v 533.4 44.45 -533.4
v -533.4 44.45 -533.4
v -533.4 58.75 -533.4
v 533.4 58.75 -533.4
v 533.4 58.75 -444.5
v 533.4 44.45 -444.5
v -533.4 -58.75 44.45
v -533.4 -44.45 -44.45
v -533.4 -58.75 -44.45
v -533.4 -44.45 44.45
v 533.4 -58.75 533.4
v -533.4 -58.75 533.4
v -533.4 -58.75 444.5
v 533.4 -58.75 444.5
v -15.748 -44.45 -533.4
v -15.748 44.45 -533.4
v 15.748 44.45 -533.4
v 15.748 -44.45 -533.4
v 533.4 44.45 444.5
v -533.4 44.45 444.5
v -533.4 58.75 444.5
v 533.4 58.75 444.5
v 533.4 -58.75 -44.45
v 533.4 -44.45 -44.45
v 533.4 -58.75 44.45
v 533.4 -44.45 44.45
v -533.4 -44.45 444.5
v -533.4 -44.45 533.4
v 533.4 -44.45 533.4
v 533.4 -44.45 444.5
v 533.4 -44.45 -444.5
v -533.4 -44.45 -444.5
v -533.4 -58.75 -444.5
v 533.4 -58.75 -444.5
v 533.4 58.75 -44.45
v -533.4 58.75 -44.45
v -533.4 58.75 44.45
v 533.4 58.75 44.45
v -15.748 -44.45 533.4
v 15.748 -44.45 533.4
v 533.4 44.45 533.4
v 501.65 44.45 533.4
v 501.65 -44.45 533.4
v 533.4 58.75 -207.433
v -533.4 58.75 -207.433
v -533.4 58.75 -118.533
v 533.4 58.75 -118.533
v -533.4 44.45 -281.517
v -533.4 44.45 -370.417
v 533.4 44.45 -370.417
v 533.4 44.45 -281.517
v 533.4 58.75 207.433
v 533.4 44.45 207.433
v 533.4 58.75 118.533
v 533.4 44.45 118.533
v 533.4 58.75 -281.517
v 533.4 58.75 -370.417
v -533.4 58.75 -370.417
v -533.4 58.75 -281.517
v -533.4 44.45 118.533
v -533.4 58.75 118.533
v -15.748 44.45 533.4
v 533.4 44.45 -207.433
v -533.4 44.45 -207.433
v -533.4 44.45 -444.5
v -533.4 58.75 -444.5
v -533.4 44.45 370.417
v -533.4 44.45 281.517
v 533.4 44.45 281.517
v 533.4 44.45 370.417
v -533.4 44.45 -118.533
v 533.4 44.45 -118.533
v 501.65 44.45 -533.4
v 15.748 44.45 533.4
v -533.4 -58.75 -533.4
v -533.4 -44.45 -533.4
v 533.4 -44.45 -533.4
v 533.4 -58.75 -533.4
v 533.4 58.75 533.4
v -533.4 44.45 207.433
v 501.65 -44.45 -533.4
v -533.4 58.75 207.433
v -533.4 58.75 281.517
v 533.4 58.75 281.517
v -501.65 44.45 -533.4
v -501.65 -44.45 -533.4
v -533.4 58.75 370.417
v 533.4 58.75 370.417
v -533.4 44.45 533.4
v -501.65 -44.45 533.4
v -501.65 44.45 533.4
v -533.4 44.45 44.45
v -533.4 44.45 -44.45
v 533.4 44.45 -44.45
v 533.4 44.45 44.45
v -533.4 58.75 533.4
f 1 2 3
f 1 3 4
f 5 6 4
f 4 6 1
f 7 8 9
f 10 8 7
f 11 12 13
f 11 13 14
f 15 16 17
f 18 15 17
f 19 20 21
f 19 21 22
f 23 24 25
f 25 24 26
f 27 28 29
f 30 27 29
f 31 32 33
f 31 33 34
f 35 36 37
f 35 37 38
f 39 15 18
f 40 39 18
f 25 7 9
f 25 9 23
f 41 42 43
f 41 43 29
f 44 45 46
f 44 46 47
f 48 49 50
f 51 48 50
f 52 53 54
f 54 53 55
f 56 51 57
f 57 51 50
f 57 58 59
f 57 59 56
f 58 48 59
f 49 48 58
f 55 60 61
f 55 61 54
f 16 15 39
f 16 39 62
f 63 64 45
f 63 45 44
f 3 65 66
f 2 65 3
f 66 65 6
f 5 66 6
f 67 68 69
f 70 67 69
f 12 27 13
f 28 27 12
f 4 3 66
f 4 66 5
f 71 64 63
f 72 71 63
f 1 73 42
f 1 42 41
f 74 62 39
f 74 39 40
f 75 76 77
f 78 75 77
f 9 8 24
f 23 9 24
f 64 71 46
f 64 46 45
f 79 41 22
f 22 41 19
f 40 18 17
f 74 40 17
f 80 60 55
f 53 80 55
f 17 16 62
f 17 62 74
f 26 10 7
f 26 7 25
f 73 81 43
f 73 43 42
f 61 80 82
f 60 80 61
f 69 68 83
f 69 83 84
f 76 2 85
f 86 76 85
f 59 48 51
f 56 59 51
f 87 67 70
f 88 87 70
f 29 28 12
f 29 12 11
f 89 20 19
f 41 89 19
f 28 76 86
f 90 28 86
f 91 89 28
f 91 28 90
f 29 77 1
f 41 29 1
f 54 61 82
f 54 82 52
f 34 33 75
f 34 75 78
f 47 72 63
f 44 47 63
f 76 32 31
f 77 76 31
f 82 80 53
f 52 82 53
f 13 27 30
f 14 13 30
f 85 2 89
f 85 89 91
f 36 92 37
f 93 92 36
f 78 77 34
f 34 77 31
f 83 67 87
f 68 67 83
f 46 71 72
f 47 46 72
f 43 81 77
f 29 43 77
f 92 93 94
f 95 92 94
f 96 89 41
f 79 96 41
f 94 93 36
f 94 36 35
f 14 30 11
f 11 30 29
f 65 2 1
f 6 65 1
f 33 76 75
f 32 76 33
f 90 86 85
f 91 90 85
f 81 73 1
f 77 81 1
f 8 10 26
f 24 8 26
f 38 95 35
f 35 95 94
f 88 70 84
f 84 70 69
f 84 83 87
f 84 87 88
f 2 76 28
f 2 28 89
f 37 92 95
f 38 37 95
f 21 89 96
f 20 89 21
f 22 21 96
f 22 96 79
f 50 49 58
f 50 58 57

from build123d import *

# Parameters (mm, degrees)
BOSS_EXTRUDE1_DEPTH        = 533.4
BOSS_EXTRUDE1_DEPTH_BACK   = 533.4
SKETCH3_W                  = 31.75
SKETCH3_H                  = 88.9
BOSS_EXTRUDE1_2_DEPTH      = 533.4
BOSS_EXTRUDE1_2_DEPTH_BACK = 533.4
SKETCH3_W_2                = 31.496
BOSS_EXTRUDE1_3_DEPTH      = 533.4
BOSS_EXTRUDE1_3_DEPTH_BACK = 533.4
SKETCH4_W                  = 1066.8
SKETCH4_H                  = 88.9
BOSS_EXTRUDE2_DEPTH        = 14.3002
BOSS_EXTRUDE2_2_DEPTH      = 14.3002
BOSS_EXTRUDE2_3_DEPTH      = 14.3002
BOSS_EXTRUDE2_4_DEPTH      = 14.3002
BOSS_EXTRUDE2_5_DEPTH      = 14.3002
BOSS_EXTRUDE2_6_DEPTH      = 14.3002
BOSS_EXTRUDE2_7_DEPTH      = 14.3002
SKETCH5_W                  = 1066.8
SKETCH5_H                  = 88.9
BOSS_EXTRUDE3_DEPTH        = 14.3002
BOSS_EXTRUDE3_2_DEPTH      = 14.3002
BOSS_EXTRUDE3_3_DEPTH      = 14.3002


with BuildPart() as part:
    # Sketch3 → Boss-Extrude1 (new, two sides: drawn at the far end of the back side and taken through both)
    with BuildSketch(Plane.XY.offset(-BOSS_EXTRUDE1_DEPTH_BACK)):
        with Locations((-517.525, 0)):
            Rectangle(SKETCH3_W, SKETCH3_H)
    extrude(amount=BOSS_EXTRUDE1_DEPTH + BOSS_EXTRUDE1_DEPTH_BACK)


with BuildPart() as body_2:
    # Sketch3 → Boss-Extrude1 2 (new, two sides: drawn at the far end of the back side and taken through both)
    with BuildSketch(Plane.XY.offset(-BOSS_EXTRUDE1_2_DEPTH_BACK)):
        Rectangle(SKETCH3_W_2, SKETCH3_H)
    extrude(amount=BOSS_EXTRUDE1_2_DEPTH + BOSS_EXTRUDE1_2_DEPTH_BACK)


with BuildPart() as body_3:
    # Sketch3 → Boss-Extrude1 3 (new, two sides: drawn at the far end of the back side and taken through both)
    with BuildSketch(Plane.XY.offset(-BOSS_EXTRUDE1_3_DEPTH_BACK)):
        with Locations((517.525, 0)):
            Rectangle(SKETCH3_W, SKETCH3_H)
    extrude(amount=BOSS_EXTRUDE1_3_DEPTH + BOSS_EXTRUDE1_3_DEPTH_BACK)


with BuildPart() as body_4:
    # Sketch4 → Boss-Extrude2 (new body)
    with BuildSketch(Plane(origin=(0, 44.45, 0), x_dir=(1, 0, 0), z_dir=(0, 1, 0))):
        with Locations((0, -488.95)):
            Rectangle(SKETCH4_W, SKETCH4_H)
    extrude(amount=BOSS_EXTRUDE2_DEPTH)


with BuildPart() as body_5:
    # Sketch4 → Boss-Extrude2 2 (new body)
    with BuildSketch(Plane(origin=(0, 44.45, 0), x_dir=(1, 0, 0), z_dir=(0, 1, 0))):
        with Locations((0, -325.966666667)):
            Rectangle(SKETCH4_W, SKETCH4_H)
    extrude(amount=BOSS_EXTRUDE2_2_DEPTH)


with BuildPart() as body_6:
    # Sketch4 → Boss-Extrude2 3 (new body)
    with BuildSketch(Plane(origin=(0, 44.45, 0), x_dir=(1, 0, 0), z_dir=(0, 1, 0))):
        with Locations((0, -162.983333333)):
            Rectangle(SKETCH4_W, SKETCH4_H)
    extrude(amount=BOSS_EXTRUDE2_3_DEPTH)


with BuildPart() as body_7:
    # Sketch4 → Boss-Extrude2 4 (new body)
    with BuildSketch(Plane(origin=(0, 44.45, 0), x_dir=(1, 0, 0), z_dir=(0, 1, 0))):
        Rectangle(SKETCH4_W, SKETCH4_H)
    extrude(amount=BOSS_EXTRUDE2_4_DEPTH)


with BuildPart() as body_8:
    # Sketch4 → Boss-Extrude2 5 (new body)
    with BuildSketch(Plane(origin=(0, 44.45, 0), x_dir=(1, 0, 0), z_dir=(0, 1, 0))):
        with Locations((0, 162.983333333)):
            Rectangle(SKETCH4_W, SKETCH4_H)
    extrude(amount=BOSS_EXTRUDE2_5_DEPTH)


with BuildPart() as body_9:
    # Sketch4 → Boss-Extrude2 6 (new body)
    with BuildSketch(Plane(origin=(0, 44.45, 0), x_dir=(1, 0, 0), z_dir=(0, 1, 0))):
        with Locations((0, 325.966666667)):
            Rectangle(SKETCH4_W, SKETCH4_H)
    extrude(amount=BOSS_EXTRUDE2_6_DEPTH)


with BuildPart() as body_10:
    # Sketch4 → Boss-Extrude2 7 (new body)
    with BuildSketch(Plane(origin=(0, 44.45, 0), x_dir=(1, 0, 0), z_dir=(0, 1, 0))):
        with Locations((0, 488.95)):
            Rectangle(SKETCH4_W, SKETCH4_H)
    extrude(amount=BOSS_EXTRUDE2_7_DEPTH)


with BuildPart() as body_11:
    # Sketch5 → Boss-Extrude3 (new body)
    with BuildSketch(Plane.XZ.offset(44.45)):
        with Locations((0, 488.95)):
            Rectangle(SKETCH5_W, SKETCH5_H)
    extrude(amount=BOSS_EXTRUDE3_DEPTH)


with BuildPart() as body_12:
    # Sketch5 → Boss-Extrude3 2 (new body)
    with BuildSketch(Plane.XZ.offset(44.45)):
        with Locations((0, -488.95)):
            Rectangle(SKETCH5_W, SKETCH5_H)
    extrude(amount=BOSS_EXTRUDE3_2_DEPTH)


with BuildPart() as body_13:
    # Sketch5 → Boss-Extrude3 3 (new body)
    with BuildSketch(Plane.XZ.offset(44.45)):
        Rectangle(SKETCH5_W, SKETCH5_H)
    extrude(amount=BOSS_EXTRUDE3_3_DEPTH)


solid = Compound([part.part, body_2.part, body_3.part, body_4.part, body_5.part, body_6.part, body_7.part, body_8.part, body_9.part, body_10.part, body_11.part, body_12.part, body_13.part])
